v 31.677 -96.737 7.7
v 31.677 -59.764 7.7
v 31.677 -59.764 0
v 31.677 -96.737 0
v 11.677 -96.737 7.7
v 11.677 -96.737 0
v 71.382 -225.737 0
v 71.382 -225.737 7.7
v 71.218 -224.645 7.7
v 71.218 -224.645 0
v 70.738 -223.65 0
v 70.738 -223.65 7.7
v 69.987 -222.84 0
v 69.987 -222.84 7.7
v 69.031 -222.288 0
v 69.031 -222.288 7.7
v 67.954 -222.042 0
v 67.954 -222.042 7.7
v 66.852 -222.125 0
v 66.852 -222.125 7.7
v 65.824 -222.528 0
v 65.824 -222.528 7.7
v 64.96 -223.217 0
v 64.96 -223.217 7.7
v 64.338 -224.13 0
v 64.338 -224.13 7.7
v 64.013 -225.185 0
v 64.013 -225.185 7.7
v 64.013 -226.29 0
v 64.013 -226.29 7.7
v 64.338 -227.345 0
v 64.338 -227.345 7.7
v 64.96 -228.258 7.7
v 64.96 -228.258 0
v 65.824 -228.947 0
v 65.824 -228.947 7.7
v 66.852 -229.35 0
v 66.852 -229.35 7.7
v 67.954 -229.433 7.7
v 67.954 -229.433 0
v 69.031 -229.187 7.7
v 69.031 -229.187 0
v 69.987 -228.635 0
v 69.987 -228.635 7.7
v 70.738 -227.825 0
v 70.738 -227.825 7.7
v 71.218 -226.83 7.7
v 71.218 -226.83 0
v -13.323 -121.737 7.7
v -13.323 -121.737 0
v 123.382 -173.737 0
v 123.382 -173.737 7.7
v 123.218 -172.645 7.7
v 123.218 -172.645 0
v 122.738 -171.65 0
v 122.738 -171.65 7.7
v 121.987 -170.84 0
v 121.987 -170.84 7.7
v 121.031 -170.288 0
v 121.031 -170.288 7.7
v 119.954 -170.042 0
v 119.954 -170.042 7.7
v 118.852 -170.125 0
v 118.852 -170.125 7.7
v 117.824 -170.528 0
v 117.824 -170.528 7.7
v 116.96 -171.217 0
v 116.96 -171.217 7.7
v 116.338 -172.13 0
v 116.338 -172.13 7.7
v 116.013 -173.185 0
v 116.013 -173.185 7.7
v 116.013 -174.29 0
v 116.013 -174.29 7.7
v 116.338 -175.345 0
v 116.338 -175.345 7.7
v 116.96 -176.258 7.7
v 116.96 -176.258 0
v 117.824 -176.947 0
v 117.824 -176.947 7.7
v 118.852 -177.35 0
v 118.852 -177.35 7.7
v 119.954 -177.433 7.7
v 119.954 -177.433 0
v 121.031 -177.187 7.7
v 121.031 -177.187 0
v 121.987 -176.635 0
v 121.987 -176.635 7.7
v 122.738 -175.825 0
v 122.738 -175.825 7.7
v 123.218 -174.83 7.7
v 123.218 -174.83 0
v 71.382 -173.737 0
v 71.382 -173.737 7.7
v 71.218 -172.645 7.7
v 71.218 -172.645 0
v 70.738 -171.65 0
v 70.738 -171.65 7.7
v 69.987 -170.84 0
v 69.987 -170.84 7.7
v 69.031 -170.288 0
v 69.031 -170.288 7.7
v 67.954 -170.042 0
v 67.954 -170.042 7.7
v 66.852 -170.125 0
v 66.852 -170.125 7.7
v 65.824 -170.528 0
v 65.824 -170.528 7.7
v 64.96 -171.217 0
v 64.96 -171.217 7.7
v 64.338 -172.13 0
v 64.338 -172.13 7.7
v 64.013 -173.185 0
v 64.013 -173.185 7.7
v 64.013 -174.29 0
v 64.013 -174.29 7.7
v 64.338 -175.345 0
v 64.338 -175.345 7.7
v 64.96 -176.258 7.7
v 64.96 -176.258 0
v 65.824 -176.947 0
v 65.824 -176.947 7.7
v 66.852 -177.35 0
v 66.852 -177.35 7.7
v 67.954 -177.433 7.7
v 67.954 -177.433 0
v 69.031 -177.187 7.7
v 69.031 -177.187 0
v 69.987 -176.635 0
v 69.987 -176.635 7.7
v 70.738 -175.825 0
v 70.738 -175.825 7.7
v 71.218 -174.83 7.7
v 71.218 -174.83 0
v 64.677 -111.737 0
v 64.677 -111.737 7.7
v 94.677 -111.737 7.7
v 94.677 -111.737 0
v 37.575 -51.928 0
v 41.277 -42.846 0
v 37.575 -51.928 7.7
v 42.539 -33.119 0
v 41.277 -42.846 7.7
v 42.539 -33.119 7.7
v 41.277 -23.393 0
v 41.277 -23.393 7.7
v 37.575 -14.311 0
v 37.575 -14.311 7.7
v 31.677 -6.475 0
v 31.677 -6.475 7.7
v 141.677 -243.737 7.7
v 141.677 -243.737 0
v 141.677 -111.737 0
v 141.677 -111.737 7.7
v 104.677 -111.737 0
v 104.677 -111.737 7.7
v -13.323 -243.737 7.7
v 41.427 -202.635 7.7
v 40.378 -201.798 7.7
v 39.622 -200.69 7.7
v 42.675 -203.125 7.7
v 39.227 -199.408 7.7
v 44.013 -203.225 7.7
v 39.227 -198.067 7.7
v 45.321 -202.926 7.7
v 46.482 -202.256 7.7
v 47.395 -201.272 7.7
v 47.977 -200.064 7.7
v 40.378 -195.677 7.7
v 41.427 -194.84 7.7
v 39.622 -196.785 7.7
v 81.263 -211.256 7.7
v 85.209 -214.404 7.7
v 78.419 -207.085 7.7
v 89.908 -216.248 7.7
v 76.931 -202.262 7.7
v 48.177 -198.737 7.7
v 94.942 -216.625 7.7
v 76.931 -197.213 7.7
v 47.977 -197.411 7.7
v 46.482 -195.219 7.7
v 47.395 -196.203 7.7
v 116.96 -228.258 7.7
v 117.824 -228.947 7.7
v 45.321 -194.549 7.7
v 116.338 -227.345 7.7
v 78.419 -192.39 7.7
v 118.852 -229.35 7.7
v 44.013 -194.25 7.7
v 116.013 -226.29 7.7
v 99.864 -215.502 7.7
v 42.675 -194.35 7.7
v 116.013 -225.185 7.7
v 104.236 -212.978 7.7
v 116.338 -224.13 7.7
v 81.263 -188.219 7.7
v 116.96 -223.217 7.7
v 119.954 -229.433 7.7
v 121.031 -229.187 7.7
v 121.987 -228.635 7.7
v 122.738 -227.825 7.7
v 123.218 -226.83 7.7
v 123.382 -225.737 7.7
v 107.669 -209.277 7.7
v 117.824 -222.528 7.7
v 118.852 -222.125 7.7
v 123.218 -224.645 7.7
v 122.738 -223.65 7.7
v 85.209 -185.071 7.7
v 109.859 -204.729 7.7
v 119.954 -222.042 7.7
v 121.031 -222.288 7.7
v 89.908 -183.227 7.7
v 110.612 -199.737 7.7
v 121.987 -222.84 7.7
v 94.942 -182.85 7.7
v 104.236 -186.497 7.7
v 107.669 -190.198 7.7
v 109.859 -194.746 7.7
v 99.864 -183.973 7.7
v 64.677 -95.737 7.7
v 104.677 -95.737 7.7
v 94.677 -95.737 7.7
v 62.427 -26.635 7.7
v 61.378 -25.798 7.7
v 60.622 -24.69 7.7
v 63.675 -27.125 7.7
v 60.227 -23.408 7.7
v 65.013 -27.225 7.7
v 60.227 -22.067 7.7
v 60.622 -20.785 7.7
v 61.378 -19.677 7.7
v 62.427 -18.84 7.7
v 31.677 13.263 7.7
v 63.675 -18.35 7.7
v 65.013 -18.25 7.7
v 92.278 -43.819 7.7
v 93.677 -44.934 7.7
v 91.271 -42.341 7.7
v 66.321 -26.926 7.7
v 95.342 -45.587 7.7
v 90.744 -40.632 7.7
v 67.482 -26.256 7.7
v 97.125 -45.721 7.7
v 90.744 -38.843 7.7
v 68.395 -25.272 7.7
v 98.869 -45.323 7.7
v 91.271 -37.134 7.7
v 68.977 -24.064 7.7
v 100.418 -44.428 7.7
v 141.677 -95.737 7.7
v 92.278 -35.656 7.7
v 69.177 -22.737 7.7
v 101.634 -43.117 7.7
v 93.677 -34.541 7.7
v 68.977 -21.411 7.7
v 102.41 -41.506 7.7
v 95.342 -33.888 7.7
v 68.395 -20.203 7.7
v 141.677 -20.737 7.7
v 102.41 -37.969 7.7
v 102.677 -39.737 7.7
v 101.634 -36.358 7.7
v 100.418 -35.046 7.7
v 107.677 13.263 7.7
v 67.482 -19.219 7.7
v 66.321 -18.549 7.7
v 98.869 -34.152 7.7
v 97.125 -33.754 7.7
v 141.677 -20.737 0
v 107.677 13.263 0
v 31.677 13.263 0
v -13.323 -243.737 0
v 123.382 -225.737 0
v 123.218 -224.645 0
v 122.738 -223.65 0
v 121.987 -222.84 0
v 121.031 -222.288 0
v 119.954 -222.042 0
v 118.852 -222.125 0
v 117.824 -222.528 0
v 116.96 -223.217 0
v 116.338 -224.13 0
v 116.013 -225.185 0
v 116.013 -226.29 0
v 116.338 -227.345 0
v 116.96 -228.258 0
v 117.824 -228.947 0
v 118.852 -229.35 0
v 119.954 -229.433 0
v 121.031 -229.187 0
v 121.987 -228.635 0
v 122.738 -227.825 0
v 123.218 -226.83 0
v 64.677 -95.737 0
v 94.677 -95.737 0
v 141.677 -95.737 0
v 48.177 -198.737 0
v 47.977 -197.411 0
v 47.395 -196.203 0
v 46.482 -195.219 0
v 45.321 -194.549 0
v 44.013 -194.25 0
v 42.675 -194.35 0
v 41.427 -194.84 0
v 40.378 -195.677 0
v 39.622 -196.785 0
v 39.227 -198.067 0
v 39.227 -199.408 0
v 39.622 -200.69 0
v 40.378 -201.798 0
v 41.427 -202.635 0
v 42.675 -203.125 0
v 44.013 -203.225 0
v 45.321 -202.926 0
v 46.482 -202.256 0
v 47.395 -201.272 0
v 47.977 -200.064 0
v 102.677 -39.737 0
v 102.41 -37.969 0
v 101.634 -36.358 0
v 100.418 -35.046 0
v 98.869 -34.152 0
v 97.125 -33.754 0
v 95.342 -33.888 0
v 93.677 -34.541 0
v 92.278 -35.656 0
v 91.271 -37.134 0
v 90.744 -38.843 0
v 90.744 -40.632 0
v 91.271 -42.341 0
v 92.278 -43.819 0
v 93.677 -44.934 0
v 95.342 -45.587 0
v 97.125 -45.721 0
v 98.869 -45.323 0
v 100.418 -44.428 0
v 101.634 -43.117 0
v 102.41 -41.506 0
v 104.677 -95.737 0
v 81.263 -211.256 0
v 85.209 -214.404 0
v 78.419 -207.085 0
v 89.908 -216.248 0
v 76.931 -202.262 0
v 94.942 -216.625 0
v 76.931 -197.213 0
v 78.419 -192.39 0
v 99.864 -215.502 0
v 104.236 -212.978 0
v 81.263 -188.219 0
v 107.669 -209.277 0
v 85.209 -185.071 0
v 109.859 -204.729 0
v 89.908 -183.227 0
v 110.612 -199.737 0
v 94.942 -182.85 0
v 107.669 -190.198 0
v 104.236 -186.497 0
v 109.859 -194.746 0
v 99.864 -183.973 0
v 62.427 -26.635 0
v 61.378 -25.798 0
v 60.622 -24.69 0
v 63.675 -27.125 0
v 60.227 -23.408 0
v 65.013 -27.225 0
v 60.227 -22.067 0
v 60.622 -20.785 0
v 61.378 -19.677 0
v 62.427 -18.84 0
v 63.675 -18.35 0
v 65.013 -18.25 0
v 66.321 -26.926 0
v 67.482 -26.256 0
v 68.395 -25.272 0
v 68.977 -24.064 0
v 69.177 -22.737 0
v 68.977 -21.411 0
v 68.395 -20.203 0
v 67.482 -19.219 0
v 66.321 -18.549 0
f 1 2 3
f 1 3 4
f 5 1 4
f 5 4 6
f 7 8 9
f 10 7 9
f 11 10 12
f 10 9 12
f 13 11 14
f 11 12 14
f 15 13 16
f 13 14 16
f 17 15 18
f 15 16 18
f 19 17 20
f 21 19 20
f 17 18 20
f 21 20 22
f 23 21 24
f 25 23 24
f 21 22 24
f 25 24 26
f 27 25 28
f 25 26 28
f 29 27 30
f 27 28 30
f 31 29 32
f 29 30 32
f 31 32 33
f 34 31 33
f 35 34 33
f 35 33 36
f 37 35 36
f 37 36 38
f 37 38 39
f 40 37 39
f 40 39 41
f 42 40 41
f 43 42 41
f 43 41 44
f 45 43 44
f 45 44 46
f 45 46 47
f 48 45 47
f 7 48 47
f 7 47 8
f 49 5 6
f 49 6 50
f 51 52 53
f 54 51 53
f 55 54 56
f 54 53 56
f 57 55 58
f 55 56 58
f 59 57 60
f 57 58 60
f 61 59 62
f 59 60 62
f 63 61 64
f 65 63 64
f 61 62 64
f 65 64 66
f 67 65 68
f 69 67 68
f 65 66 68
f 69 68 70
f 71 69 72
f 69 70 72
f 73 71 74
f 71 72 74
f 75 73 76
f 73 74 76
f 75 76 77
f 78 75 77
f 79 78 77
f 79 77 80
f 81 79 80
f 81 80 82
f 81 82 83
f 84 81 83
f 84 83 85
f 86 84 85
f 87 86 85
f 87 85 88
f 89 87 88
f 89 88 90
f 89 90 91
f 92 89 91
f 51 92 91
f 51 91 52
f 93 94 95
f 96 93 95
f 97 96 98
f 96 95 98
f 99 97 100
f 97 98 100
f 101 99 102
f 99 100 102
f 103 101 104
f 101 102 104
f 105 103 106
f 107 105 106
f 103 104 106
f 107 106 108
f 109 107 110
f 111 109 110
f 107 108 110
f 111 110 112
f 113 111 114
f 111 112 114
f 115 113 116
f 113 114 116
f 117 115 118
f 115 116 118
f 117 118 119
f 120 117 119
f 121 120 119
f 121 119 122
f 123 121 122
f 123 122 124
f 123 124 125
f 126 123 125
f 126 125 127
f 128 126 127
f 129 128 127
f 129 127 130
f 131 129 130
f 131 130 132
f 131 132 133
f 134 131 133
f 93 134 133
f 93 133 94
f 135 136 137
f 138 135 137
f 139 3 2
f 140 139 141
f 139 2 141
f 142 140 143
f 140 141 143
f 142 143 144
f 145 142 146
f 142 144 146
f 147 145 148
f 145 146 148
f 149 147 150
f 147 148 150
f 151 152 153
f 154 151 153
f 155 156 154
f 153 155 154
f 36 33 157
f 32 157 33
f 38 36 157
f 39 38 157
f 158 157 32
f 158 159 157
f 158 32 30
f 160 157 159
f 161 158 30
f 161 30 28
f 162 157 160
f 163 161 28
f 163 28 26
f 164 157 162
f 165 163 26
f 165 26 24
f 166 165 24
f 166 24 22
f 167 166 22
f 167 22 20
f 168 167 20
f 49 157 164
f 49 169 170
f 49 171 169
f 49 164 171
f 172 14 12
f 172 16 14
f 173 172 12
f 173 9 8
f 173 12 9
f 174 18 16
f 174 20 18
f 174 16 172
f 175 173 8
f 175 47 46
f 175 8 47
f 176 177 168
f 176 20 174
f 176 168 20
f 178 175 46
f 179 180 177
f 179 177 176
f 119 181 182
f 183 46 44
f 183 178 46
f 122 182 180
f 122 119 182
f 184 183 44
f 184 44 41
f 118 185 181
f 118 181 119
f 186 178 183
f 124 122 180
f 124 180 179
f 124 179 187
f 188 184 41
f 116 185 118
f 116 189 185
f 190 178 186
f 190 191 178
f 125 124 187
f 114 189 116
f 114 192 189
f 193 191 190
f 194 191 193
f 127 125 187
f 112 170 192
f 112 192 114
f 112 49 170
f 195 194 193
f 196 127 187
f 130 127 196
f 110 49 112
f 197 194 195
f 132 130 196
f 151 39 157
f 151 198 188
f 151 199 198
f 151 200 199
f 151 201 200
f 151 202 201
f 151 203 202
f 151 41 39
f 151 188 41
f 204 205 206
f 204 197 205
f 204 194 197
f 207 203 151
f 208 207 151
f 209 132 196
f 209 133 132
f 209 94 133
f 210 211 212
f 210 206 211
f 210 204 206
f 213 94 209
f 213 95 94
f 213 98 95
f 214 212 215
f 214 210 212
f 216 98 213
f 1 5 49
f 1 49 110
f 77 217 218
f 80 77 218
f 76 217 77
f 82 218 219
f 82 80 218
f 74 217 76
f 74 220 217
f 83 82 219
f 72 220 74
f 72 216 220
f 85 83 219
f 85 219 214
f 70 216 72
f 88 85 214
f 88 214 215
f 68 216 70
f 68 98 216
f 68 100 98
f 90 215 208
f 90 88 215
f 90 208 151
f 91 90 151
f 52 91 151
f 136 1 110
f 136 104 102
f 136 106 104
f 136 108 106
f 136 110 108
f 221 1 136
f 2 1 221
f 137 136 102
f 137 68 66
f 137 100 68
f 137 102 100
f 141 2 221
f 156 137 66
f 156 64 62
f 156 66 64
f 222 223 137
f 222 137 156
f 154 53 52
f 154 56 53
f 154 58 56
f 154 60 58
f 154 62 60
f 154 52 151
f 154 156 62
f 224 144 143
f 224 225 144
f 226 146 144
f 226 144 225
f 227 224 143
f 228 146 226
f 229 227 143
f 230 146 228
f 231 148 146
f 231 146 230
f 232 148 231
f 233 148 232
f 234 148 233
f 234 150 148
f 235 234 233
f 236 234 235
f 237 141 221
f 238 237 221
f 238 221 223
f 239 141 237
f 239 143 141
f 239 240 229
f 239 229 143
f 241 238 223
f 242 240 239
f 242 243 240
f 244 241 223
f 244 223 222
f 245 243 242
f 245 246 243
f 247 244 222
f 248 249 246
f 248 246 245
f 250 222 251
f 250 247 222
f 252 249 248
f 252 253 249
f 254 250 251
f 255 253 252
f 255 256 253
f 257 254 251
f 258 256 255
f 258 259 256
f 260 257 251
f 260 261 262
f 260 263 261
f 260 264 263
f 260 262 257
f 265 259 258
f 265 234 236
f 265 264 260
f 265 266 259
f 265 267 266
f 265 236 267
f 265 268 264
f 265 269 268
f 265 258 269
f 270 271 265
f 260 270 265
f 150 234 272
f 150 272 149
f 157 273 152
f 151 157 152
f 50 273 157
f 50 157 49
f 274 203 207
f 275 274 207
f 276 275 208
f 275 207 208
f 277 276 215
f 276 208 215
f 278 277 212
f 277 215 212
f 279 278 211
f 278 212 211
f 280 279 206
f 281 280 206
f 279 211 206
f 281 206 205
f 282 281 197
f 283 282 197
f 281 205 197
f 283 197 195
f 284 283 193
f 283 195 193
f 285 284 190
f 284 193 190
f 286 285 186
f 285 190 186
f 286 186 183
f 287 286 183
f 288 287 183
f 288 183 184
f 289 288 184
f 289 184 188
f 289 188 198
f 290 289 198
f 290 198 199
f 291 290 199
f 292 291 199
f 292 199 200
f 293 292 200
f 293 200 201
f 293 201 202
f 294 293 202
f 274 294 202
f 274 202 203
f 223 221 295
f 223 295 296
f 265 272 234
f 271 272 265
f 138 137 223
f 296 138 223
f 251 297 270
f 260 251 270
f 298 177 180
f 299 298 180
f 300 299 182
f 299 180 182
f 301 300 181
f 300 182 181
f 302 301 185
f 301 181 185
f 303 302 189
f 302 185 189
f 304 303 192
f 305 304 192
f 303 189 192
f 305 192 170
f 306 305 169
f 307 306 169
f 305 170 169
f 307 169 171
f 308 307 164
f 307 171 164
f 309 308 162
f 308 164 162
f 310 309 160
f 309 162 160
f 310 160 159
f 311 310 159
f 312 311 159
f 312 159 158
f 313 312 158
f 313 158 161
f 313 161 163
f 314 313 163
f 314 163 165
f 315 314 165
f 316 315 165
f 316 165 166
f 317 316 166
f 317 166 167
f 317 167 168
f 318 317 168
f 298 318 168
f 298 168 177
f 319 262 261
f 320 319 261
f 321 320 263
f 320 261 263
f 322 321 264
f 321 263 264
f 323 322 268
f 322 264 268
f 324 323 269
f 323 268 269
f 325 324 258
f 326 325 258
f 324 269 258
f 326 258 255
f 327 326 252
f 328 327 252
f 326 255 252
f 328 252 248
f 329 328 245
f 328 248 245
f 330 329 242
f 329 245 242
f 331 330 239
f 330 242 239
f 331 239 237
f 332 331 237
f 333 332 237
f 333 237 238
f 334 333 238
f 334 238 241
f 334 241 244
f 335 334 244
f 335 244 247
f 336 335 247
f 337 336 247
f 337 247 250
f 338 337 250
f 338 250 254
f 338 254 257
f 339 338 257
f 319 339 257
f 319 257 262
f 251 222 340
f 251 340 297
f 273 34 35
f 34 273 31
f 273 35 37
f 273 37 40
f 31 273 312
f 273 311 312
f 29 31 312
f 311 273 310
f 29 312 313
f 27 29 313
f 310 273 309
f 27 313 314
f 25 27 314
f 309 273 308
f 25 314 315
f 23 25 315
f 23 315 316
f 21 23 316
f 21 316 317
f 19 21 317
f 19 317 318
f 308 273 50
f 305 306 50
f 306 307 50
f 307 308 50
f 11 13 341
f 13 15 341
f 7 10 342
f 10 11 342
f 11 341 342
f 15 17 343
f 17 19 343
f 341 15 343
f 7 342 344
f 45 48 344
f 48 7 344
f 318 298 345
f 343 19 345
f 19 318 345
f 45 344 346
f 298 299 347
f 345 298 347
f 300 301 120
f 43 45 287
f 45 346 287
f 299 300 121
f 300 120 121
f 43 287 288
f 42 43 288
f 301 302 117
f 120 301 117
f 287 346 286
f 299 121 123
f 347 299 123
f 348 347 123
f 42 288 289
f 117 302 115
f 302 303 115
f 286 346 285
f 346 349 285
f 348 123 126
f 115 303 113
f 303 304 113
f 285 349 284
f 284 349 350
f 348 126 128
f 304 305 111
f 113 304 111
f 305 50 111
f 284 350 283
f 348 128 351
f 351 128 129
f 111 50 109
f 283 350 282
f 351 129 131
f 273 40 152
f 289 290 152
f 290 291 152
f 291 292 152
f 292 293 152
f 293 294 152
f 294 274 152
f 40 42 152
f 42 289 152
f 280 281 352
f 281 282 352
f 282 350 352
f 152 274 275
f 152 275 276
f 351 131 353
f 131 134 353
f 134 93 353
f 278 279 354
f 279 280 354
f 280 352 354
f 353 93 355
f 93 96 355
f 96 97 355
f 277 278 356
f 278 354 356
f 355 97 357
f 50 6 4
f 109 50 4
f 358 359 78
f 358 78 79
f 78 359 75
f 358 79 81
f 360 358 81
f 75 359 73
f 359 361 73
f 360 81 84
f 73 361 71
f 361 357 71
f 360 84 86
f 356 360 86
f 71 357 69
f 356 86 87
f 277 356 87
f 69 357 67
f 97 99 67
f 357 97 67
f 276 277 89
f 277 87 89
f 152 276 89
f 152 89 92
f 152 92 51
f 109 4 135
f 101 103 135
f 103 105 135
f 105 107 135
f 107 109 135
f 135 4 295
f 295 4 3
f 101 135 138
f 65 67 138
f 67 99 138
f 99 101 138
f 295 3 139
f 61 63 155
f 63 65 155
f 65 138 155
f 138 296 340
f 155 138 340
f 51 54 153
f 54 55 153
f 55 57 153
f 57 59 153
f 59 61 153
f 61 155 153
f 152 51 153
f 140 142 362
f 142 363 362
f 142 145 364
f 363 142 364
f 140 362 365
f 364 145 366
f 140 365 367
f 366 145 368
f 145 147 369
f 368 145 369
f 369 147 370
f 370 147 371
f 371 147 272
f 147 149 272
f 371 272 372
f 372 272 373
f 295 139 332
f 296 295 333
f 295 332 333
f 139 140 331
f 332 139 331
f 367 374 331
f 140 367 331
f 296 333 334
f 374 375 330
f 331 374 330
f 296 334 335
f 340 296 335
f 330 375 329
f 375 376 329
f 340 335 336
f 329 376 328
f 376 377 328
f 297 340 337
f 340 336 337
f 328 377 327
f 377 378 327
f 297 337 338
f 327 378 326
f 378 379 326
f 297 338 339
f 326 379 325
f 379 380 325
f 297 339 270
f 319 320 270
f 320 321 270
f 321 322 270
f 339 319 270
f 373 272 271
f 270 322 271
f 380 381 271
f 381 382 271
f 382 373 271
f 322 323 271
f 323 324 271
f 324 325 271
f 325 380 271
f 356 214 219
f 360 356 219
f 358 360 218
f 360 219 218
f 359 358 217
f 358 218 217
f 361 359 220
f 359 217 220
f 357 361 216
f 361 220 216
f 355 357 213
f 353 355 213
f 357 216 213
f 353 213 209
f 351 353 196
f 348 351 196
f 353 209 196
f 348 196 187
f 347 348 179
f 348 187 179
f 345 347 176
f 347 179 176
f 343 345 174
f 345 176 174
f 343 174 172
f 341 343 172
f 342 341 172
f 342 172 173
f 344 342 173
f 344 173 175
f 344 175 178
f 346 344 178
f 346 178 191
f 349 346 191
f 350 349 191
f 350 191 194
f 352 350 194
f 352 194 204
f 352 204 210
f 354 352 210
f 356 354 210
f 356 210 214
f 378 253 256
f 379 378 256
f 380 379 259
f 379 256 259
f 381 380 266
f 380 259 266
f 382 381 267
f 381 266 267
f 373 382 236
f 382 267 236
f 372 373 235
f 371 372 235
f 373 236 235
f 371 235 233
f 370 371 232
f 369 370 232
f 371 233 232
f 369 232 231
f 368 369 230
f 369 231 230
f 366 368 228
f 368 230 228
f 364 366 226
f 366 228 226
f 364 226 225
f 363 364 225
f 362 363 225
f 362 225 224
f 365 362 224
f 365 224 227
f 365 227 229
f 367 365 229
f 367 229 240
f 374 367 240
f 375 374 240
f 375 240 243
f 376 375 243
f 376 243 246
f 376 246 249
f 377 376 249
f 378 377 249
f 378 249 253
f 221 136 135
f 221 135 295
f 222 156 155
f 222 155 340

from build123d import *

# Parameters (mm, degrees)
SKETCH1_W            = 155
SKETCH1_H            = 257
BOSS_EXTRUDE1_DEPTH  = 7.7
CHAMFER1_SIZE        = 34
SKETCH2_R            = 4.5
SKETCH2_W            = 37
SKETCH2_H            = 16
CUT_EXTRUDE1_DEPTH   = 10
SKETCH3_R            = 38.109899267
CUT_EXTRUDE2_DEPTH   = 10
CUT_EXTRUDE3_DEPTH   = 10
SKETCH5_R            = 16.935062279
CUT_EXTRUDE4_DEPTH   = 10
SKETCH6_R            = 3.705491154
CUT_EXTRUDE5_DEPTH   = 10
LPATTERN1_COUNT      = 2
LPATTERN1_PITCH      = 52
LPATTERN1_COUNT_DIR2 = 2
LPATTERN1_PITCH_DIR2 = 52
SKETCH7_R            = 6
CUT_EXTRUDE6_DEPTH   = 10
SKETCH8_W            = 30
SKETCH8_H            = 16
CUT_EXTRUDE7_DEPTH   = 10


with BuildPart() as part:
    # Sketch1 → Boss-Extrude1 (new body)
    with BuildSketch(Plane.XY):
        with Locations((64.176783005, -115.237481032)):
            Rectangle(SKETCH1_W, SKETCH1_H)
    extrude(amount=BOSS_EXTRUDE1_DEPTH)

    # Chamfer1
    chamfer1_edges = [part.edges().sort_by_distance(p)[0] for p in [
        (141.676783005, 13.262518968, 3.85),
    ]]
    chamfer(chamfer1_edges, length=CHAMFER1_SIZE)

    # Sketch2 → Cut-Extrude1 (cut)
    with BuildSketch(Plane.XY.offset(7.7)):
        with Locations((64.676783005, -22.737481032)):
            Circle(SKETCH2_R)
        with Locations((43.676783005, -198.737481032)):
            Circle(SKETCH2_R)
        with Locations((123.176783005, -103.737481032)):
            Rectangle(SKETCH2_W, SKETCH2_H)
    extrude(amount=-CUT_EXTRUDE1_DEPTH, mode=Mode.SUBTRACT)

    # Sketch3 → Cut-Extrude2 (cut)
    with BuildSketch(Plane.XY.offset(7.7)):
        with Locations((4.429117296, -33.119350325)):
            Circle(SKETCH3_R)
    extrude(amount=-CUT_EXTRUDE2_DEPTH, mode=Mode.SUBTRACT)

    # Sketch4 → Cut-Extrude3 (cut)
    with BuildSketch(Plane.XY.offset(7.7)):
        Polygon((31.676783005, 13.262518968), (31.676783005, -96.737481032), (11.676783005, -96.737481032), (-13.323216995, -121.737481032), (-67.69781948, -122.43585218), (-69.553853122, 22.073398829), (23.898503121, 29.809405578), align=None)
    extrude(amount=-CUT_EXTRUDE3_DEPTH, mode=Mode.SUBTRACT)

    # Sketch5 → Cut-Extrude4 (cut)
    with BuildSketch(Plane.XY.offset(7.7)):
        with Locations((93.676783005, -199.737481032)):
            Circle(SKETCH5_R)
    extrude(amount=-CUT_EXTRUDE4_DEPTH, mode=Mode.SUBTRACT)

    # Sketch6 → Cut-Extrude5 (cut)
    with BuildSketch(Plane.XY.offset(7.7)):
        with Locations((67.676783005, -225.737481032)):
            Circle(SKETCH6_R)
    cut_extrude5 = extrude(amount=-CUT_EXTRUDE5_DEPTH, mode=Mode.SUBTRACT)

    # LPattern1: Cut-Extrude5 2 × 2
    with Locations(*[(j * LPATTERN1_PITCH_DIR2, i * LPATTERN1_PITCH, 0) for i in range(LPATTERN1_COUNT) for j in range(LPATTERN1_COUNT_DIR2) if (i, j) != (0, 0)]):
        add(cut_extrude5, mode=Mode.SUBTRACT)

    # Sketch7 → Cut-Extrude6 (cut)
    with BuildSketch(Plane.XY.offset(7.7)):
        with Locations((96.676783005, -39.737481032)):
            Circle(SKETCH7_R)
    extrude(amount=-CUT_EXTRUDE6_DEPTH, mode=Mode.SUBTRACT)

    # Sketch8 → Cut-Extrude7 (cut)
    with BuildSketch(Plane.XY.offset(7.7)):
        with Locations((79.676783005, -103.737481032)):
            Rectangle(SKETCH8_W, SKETCH8_H)
    extrude(amount=-CUT_EXTRUDE7_DEPTH, mode=Mode.SUBTRACT)


solid = part.part
